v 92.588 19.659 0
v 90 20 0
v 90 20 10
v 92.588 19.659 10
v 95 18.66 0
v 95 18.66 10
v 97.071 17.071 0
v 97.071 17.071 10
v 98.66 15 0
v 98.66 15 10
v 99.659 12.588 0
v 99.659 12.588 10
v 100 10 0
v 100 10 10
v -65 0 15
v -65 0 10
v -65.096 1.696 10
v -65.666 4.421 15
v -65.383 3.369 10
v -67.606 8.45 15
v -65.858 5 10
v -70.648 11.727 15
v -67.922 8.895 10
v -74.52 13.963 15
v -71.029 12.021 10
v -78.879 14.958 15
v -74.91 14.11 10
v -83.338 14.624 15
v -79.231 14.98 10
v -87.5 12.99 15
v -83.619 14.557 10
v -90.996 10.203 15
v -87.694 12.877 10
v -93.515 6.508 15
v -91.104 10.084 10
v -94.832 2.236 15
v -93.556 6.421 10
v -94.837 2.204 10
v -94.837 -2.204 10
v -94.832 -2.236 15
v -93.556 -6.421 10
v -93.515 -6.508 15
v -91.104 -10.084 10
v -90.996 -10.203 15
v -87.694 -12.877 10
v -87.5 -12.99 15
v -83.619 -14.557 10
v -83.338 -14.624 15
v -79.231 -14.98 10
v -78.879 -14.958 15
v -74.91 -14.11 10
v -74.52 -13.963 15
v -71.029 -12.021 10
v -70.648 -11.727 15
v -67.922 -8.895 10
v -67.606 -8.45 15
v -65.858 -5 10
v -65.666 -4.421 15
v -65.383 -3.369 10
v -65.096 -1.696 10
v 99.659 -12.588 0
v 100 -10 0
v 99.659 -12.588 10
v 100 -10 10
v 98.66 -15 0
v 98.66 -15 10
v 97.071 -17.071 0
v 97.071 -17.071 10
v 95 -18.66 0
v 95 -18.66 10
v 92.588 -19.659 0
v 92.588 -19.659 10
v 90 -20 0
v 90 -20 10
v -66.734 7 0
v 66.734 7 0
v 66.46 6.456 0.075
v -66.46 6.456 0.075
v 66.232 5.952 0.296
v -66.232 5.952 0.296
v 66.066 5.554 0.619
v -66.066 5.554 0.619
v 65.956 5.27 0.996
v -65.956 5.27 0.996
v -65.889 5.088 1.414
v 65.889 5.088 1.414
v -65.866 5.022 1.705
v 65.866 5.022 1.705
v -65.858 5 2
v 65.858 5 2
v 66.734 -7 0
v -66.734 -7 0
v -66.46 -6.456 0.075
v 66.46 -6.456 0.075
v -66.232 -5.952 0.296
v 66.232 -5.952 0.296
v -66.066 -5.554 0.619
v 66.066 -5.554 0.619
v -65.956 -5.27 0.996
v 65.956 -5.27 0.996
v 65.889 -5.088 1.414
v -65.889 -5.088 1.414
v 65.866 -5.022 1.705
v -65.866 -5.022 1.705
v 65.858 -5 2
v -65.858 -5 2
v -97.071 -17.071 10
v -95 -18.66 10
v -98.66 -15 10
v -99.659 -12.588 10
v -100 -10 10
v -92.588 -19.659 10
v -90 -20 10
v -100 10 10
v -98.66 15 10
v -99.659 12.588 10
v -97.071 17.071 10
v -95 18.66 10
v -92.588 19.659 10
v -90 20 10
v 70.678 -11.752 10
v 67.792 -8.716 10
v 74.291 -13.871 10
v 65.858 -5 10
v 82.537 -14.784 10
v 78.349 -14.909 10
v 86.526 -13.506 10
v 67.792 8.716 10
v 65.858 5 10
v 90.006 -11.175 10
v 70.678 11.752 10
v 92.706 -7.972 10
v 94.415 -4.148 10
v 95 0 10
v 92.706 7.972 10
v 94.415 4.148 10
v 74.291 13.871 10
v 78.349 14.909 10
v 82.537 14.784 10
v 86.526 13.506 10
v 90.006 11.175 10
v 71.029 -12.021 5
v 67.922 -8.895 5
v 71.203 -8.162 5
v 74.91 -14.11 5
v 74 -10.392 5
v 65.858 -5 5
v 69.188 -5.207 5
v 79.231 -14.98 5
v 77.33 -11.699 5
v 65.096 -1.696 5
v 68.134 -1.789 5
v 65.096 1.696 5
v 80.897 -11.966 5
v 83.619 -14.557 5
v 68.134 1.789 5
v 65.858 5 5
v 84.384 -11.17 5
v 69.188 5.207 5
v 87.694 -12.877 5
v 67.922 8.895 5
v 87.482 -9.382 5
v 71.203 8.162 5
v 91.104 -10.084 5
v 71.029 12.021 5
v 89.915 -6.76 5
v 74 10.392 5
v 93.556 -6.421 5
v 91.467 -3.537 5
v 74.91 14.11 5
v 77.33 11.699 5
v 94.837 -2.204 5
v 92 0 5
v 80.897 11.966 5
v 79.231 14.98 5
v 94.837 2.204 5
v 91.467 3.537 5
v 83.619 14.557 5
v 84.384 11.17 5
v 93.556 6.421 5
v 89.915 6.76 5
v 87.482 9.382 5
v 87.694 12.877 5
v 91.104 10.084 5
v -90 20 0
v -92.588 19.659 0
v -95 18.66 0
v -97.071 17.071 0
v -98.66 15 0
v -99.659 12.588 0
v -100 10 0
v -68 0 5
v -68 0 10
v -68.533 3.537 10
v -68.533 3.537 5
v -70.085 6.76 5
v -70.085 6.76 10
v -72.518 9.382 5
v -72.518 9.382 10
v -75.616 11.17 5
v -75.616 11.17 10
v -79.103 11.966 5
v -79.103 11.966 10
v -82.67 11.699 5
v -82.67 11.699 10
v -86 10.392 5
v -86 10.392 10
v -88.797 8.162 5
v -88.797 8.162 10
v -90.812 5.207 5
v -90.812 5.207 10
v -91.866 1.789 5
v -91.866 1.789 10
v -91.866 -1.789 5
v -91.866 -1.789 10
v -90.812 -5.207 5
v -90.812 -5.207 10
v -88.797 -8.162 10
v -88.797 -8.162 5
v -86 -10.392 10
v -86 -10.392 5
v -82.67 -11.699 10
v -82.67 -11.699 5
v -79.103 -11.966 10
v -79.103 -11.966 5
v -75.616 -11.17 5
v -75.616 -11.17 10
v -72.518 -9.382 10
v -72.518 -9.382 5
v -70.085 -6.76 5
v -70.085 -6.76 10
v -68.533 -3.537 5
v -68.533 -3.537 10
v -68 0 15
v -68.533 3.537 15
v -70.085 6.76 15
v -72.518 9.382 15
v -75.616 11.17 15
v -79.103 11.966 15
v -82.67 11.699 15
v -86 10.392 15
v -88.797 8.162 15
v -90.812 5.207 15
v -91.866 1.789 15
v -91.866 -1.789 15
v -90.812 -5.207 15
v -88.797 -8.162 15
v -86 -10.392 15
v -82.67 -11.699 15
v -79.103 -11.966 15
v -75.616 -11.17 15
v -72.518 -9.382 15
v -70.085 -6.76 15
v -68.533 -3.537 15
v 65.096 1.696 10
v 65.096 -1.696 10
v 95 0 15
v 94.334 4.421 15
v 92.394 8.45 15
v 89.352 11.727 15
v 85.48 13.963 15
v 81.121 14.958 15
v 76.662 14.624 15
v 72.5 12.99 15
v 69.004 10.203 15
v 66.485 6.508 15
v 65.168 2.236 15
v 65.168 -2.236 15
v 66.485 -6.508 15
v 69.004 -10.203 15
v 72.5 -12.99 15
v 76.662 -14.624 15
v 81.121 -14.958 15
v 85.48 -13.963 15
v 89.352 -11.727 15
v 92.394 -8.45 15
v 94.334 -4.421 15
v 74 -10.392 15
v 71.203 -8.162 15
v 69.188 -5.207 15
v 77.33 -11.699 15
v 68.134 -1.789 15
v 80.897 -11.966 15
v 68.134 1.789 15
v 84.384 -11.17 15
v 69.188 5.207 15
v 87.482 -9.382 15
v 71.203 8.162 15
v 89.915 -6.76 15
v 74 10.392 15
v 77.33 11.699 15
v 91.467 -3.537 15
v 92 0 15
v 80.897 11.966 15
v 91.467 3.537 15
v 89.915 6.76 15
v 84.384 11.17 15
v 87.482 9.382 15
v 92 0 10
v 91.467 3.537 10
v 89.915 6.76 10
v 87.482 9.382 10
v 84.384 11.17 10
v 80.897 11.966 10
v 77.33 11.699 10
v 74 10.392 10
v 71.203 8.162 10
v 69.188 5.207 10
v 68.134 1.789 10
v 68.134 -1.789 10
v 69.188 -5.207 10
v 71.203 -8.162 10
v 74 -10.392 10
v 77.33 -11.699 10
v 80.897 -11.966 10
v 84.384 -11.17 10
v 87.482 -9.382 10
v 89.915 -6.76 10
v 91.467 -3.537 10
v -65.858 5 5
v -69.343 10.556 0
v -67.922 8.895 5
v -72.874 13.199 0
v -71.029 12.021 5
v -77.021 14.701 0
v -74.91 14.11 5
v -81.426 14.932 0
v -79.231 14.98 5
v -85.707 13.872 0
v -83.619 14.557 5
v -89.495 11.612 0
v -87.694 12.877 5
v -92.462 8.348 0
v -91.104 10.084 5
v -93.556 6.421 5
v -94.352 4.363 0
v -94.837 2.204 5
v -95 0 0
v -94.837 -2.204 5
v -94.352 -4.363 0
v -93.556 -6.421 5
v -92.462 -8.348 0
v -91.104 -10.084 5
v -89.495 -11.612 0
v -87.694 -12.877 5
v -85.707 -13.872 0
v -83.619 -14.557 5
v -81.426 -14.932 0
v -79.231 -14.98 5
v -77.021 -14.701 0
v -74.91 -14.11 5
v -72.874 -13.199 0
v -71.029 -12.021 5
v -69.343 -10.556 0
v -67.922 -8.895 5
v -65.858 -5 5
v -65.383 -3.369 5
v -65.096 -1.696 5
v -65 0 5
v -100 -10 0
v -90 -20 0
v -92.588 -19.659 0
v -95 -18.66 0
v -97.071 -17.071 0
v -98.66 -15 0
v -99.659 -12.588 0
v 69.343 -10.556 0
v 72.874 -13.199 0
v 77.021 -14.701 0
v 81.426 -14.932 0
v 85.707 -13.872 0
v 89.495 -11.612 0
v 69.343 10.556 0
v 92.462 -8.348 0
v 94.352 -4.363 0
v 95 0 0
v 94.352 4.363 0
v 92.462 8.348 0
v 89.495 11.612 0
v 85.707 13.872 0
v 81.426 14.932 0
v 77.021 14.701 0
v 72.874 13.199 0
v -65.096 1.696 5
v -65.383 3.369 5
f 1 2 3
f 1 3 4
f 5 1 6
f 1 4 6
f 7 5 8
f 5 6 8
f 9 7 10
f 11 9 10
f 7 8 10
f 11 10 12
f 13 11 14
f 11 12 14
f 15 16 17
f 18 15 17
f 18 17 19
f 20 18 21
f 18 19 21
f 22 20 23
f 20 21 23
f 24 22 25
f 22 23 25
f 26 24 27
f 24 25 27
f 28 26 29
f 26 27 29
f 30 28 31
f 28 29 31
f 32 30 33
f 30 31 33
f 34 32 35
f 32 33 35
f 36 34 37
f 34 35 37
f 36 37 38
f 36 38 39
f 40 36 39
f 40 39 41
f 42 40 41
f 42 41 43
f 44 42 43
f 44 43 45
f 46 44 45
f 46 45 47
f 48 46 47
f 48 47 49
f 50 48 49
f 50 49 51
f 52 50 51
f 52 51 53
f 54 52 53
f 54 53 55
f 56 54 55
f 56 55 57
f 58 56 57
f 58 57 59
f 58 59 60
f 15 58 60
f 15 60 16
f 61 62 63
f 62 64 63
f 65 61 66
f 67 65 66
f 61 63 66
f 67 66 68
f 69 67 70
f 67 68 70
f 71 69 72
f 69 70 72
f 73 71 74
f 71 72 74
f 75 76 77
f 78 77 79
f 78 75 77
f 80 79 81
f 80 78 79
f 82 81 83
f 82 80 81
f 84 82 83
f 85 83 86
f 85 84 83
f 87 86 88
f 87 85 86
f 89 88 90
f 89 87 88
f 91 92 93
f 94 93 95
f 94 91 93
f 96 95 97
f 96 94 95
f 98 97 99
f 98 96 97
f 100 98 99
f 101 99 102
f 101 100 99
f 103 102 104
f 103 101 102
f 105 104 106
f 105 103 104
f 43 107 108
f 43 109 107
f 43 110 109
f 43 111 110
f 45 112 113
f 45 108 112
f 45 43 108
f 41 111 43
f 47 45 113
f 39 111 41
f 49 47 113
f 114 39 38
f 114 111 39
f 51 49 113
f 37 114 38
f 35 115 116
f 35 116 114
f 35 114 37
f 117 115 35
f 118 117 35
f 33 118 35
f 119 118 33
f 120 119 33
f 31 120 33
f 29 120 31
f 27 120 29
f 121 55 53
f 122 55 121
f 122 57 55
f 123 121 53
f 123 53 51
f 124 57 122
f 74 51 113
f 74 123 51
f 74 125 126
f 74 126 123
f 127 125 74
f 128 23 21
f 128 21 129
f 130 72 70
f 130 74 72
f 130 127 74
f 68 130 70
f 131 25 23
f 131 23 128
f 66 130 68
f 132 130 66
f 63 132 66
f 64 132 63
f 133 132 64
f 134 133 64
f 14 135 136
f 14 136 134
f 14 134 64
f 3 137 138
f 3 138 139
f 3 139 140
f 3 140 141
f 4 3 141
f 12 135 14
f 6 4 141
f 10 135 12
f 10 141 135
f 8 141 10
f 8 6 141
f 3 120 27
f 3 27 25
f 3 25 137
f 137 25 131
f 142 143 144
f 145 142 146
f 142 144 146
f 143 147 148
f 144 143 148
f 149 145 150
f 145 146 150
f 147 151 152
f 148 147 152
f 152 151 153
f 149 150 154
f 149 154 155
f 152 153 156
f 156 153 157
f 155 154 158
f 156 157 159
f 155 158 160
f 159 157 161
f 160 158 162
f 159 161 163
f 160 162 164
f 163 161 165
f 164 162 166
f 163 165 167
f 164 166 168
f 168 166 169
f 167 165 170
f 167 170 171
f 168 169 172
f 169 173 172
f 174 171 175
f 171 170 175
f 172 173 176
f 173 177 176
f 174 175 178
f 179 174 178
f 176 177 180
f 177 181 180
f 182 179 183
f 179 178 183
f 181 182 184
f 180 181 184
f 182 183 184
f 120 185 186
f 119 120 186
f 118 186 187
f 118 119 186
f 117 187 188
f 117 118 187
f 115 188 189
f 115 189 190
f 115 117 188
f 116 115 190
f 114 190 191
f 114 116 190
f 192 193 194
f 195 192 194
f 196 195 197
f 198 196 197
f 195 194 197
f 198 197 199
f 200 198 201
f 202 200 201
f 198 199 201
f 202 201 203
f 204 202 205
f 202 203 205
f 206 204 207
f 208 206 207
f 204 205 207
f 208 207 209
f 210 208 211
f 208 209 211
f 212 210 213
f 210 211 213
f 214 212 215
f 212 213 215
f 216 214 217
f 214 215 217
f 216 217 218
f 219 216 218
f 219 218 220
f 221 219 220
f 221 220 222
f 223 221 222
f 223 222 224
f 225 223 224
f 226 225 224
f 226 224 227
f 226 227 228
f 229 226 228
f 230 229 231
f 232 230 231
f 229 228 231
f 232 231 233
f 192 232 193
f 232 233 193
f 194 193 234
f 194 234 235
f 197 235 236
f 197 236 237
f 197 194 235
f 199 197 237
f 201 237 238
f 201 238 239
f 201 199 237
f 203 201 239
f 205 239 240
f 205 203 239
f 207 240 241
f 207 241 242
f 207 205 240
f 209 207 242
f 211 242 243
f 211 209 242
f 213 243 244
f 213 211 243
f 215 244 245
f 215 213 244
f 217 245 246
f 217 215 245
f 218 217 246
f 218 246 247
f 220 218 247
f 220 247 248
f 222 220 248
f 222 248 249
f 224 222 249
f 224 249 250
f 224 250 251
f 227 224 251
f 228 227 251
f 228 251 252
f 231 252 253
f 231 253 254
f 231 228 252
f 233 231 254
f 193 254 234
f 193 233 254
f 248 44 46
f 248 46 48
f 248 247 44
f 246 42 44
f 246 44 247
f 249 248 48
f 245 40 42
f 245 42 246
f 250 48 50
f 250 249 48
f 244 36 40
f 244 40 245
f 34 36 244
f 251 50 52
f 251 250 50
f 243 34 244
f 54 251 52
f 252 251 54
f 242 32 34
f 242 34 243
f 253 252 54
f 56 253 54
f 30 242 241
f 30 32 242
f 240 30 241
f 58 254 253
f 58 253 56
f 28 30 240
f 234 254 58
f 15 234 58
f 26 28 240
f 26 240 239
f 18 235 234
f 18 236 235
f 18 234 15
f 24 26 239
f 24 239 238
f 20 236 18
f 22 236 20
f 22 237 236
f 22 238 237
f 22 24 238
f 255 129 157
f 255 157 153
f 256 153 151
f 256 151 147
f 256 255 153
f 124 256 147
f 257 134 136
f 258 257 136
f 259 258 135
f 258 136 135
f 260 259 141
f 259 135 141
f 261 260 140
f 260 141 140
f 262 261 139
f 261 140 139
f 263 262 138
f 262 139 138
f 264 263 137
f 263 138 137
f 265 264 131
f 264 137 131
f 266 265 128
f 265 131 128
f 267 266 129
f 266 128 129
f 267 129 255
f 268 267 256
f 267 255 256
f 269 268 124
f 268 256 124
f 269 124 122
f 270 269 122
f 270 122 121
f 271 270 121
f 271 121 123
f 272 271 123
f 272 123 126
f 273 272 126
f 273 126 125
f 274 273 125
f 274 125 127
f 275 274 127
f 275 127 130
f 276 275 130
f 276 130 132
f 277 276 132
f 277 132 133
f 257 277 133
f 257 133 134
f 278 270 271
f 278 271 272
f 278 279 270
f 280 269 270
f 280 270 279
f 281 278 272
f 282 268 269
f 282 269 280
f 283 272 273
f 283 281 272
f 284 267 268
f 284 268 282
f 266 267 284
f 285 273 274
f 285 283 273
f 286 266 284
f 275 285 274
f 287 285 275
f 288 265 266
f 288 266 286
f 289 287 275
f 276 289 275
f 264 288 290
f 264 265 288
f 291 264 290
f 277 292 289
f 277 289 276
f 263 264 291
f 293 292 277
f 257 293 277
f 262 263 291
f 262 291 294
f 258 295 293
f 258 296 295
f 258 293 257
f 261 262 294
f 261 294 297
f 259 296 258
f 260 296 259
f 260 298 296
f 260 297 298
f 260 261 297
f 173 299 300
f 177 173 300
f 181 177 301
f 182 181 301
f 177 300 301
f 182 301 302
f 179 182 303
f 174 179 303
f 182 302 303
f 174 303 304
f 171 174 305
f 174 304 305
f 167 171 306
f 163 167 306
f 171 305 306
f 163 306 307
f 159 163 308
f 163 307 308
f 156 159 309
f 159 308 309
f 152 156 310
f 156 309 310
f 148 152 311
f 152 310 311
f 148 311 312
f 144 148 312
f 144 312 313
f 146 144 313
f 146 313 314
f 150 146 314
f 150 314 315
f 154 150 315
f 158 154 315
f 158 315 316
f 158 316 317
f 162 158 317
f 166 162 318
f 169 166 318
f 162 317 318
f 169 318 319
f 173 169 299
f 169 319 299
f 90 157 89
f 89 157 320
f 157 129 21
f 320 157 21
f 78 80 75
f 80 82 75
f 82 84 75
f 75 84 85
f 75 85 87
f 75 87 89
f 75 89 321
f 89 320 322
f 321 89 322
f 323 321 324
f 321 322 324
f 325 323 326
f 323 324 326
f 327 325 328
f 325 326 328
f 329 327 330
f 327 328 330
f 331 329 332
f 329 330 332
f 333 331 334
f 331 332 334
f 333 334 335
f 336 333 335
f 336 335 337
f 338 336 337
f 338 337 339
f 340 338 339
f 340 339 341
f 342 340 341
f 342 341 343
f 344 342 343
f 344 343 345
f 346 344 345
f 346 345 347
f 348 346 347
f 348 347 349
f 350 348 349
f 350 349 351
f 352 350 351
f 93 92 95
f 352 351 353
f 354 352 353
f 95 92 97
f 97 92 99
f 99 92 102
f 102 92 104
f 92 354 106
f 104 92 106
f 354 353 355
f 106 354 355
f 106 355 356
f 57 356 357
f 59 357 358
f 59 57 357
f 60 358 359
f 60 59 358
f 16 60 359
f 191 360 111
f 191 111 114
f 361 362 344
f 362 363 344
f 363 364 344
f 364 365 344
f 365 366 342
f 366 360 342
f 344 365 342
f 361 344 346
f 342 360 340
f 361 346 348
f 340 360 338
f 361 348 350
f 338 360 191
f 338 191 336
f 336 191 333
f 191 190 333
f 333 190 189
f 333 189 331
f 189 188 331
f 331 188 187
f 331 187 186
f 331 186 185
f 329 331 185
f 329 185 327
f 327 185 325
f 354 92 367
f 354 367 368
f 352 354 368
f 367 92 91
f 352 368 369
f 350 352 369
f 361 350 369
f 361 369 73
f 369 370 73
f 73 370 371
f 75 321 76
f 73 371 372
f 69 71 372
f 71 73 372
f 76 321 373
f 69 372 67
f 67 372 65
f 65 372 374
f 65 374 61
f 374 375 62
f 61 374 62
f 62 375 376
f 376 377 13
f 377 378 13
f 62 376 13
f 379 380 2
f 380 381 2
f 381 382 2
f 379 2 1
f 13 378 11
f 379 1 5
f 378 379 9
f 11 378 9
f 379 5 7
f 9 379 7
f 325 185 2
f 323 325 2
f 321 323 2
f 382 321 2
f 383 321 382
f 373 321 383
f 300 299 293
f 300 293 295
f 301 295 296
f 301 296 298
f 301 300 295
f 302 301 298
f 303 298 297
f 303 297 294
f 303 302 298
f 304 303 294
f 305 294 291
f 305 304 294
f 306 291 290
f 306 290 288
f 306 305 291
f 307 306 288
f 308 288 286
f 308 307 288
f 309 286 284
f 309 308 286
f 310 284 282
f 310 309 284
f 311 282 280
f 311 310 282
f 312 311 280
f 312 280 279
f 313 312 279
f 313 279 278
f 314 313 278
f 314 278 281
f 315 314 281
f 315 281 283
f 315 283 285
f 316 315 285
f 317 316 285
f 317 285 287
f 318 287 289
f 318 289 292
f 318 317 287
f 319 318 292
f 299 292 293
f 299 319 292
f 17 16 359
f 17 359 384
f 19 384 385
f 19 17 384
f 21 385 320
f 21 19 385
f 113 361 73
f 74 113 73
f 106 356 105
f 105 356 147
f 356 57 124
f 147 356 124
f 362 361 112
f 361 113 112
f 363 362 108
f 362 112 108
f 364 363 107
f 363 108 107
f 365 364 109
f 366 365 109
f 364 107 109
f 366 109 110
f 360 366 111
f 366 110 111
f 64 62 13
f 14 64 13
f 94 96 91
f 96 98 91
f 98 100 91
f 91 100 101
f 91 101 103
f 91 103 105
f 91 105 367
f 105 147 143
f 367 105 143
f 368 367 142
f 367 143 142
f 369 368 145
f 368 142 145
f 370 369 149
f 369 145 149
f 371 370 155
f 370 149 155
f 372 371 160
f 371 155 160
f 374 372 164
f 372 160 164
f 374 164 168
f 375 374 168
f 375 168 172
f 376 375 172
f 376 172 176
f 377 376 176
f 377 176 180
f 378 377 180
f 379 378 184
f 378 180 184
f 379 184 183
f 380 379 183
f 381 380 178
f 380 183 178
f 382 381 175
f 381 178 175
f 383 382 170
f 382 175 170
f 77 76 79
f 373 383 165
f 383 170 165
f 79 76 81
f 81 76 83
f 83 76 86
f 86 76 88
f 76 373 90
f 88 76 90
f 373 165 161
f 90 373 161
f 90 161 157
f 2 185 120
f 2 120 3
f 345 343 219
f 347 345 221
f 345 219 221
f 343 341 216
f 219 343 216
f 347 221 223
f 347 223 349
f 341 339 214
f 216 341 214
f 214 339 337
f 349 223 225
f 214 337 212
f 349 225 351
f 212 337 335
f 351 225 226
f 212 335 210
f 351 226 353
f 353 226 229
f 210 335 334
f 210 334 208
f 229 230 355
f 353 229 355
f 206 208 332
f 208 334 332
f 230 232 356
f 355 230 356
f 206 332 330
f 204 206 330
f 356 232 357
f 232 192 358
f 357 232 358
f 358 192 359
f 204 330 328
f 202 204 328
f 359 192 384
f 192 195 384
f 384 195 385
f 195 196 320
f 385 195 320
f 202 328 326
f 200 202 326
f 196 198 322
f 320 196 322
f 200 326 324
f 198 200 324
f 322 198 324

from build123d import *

# Parameters (mm, degrees)
F0_W          = 200
F0_H          = 40
F1_DEPTH      = 10
F2_R          = 15
F3_DEPTH      = 10
F5_DEPTH      = 25
F6_R          = 15
F6_R_2        = 12
F7_DEPTH      = 5
F7_DEPTH_BACK = 5
F8_R          = 10
F9_R          = 2


with BuildPart() as f1:
    # F0 (on Top) → F1 (new body)
    with BuildSketch(Plane.XY):
        Rectangle(F0_W, F0_H)
    extrude(amount=F1_DEPTH)

    # F2 (on face) → F3 (cut)
    with BuildSketch(Plane.XY.offset(10)):
        with Locations((80, 0)):
            Circle(F2_R)
        with Locations((-80, 0)):
            Circle(F2_R)
    extrude(amount=-F3_DEPTH, mode=Mode.SUBTRACT)

    # F4 (on face) → F5 (cut)
    with BuildSketch(Plane.XY.offset(10)):
        with BuildLine():
            Line((-65.8578643763, -5), (65.8578643763, -5))
            ThreePointArc((65.8578643763, -5), (65, 0), (65.8578643763, 5))
            Line((65.8578643763, 5), (-65.8578643763, 5))
            ThreePointArc((-65.8578643763, 5), (-65.2160216052, 2.5365296809), (-65, 0))
            ThreePointArc((-65, 0), (-65.2160216052, -2.5365296809), (-65.8578643763, -5))
        make_face()
    extrude(amount=-F5_DEPTH, mode=Mode.SUBTRACT)

    # F6 (on face) → F7 (join, two sides)
    with BuildSketch(Plane.XY.offset(10)) as f7_sk:
        with Locations((-80, 0)):
            Circle(F6_R)
        with Locations((-80, 0)):
            Circle(F6_R_2, mode=Mode.SUBTRACT)
        with Locations((80, 0)):
            Circle(F6_R)
        with Locations((80, 0)):
            Circle(F6_R_2, mode=Mode.SUBTRACT)
    extrude(amount=F7_DEPTH)
    extrude(f7_sk.sketch, amount=-F7_DEPTH_BACK)

    # F8
    f8_edges = [f1.edges().sort_by_distance(p)[0] for p in [
        (-100, -20, 5),
        (100, -20, 5),
        (100, 20, 5),
        (-100, 20, 5),
    ]]
    fillet(f8_edges, radius=F8_R)

    # F9
    f9_edges = [f1.edges().sort_by_distance(p)[0] for p in [
        (0, -5, 0),
        (0, 5, 0),
    ]]
    fillet(f9_edges, radius=F9_R)


solid = f1.part
